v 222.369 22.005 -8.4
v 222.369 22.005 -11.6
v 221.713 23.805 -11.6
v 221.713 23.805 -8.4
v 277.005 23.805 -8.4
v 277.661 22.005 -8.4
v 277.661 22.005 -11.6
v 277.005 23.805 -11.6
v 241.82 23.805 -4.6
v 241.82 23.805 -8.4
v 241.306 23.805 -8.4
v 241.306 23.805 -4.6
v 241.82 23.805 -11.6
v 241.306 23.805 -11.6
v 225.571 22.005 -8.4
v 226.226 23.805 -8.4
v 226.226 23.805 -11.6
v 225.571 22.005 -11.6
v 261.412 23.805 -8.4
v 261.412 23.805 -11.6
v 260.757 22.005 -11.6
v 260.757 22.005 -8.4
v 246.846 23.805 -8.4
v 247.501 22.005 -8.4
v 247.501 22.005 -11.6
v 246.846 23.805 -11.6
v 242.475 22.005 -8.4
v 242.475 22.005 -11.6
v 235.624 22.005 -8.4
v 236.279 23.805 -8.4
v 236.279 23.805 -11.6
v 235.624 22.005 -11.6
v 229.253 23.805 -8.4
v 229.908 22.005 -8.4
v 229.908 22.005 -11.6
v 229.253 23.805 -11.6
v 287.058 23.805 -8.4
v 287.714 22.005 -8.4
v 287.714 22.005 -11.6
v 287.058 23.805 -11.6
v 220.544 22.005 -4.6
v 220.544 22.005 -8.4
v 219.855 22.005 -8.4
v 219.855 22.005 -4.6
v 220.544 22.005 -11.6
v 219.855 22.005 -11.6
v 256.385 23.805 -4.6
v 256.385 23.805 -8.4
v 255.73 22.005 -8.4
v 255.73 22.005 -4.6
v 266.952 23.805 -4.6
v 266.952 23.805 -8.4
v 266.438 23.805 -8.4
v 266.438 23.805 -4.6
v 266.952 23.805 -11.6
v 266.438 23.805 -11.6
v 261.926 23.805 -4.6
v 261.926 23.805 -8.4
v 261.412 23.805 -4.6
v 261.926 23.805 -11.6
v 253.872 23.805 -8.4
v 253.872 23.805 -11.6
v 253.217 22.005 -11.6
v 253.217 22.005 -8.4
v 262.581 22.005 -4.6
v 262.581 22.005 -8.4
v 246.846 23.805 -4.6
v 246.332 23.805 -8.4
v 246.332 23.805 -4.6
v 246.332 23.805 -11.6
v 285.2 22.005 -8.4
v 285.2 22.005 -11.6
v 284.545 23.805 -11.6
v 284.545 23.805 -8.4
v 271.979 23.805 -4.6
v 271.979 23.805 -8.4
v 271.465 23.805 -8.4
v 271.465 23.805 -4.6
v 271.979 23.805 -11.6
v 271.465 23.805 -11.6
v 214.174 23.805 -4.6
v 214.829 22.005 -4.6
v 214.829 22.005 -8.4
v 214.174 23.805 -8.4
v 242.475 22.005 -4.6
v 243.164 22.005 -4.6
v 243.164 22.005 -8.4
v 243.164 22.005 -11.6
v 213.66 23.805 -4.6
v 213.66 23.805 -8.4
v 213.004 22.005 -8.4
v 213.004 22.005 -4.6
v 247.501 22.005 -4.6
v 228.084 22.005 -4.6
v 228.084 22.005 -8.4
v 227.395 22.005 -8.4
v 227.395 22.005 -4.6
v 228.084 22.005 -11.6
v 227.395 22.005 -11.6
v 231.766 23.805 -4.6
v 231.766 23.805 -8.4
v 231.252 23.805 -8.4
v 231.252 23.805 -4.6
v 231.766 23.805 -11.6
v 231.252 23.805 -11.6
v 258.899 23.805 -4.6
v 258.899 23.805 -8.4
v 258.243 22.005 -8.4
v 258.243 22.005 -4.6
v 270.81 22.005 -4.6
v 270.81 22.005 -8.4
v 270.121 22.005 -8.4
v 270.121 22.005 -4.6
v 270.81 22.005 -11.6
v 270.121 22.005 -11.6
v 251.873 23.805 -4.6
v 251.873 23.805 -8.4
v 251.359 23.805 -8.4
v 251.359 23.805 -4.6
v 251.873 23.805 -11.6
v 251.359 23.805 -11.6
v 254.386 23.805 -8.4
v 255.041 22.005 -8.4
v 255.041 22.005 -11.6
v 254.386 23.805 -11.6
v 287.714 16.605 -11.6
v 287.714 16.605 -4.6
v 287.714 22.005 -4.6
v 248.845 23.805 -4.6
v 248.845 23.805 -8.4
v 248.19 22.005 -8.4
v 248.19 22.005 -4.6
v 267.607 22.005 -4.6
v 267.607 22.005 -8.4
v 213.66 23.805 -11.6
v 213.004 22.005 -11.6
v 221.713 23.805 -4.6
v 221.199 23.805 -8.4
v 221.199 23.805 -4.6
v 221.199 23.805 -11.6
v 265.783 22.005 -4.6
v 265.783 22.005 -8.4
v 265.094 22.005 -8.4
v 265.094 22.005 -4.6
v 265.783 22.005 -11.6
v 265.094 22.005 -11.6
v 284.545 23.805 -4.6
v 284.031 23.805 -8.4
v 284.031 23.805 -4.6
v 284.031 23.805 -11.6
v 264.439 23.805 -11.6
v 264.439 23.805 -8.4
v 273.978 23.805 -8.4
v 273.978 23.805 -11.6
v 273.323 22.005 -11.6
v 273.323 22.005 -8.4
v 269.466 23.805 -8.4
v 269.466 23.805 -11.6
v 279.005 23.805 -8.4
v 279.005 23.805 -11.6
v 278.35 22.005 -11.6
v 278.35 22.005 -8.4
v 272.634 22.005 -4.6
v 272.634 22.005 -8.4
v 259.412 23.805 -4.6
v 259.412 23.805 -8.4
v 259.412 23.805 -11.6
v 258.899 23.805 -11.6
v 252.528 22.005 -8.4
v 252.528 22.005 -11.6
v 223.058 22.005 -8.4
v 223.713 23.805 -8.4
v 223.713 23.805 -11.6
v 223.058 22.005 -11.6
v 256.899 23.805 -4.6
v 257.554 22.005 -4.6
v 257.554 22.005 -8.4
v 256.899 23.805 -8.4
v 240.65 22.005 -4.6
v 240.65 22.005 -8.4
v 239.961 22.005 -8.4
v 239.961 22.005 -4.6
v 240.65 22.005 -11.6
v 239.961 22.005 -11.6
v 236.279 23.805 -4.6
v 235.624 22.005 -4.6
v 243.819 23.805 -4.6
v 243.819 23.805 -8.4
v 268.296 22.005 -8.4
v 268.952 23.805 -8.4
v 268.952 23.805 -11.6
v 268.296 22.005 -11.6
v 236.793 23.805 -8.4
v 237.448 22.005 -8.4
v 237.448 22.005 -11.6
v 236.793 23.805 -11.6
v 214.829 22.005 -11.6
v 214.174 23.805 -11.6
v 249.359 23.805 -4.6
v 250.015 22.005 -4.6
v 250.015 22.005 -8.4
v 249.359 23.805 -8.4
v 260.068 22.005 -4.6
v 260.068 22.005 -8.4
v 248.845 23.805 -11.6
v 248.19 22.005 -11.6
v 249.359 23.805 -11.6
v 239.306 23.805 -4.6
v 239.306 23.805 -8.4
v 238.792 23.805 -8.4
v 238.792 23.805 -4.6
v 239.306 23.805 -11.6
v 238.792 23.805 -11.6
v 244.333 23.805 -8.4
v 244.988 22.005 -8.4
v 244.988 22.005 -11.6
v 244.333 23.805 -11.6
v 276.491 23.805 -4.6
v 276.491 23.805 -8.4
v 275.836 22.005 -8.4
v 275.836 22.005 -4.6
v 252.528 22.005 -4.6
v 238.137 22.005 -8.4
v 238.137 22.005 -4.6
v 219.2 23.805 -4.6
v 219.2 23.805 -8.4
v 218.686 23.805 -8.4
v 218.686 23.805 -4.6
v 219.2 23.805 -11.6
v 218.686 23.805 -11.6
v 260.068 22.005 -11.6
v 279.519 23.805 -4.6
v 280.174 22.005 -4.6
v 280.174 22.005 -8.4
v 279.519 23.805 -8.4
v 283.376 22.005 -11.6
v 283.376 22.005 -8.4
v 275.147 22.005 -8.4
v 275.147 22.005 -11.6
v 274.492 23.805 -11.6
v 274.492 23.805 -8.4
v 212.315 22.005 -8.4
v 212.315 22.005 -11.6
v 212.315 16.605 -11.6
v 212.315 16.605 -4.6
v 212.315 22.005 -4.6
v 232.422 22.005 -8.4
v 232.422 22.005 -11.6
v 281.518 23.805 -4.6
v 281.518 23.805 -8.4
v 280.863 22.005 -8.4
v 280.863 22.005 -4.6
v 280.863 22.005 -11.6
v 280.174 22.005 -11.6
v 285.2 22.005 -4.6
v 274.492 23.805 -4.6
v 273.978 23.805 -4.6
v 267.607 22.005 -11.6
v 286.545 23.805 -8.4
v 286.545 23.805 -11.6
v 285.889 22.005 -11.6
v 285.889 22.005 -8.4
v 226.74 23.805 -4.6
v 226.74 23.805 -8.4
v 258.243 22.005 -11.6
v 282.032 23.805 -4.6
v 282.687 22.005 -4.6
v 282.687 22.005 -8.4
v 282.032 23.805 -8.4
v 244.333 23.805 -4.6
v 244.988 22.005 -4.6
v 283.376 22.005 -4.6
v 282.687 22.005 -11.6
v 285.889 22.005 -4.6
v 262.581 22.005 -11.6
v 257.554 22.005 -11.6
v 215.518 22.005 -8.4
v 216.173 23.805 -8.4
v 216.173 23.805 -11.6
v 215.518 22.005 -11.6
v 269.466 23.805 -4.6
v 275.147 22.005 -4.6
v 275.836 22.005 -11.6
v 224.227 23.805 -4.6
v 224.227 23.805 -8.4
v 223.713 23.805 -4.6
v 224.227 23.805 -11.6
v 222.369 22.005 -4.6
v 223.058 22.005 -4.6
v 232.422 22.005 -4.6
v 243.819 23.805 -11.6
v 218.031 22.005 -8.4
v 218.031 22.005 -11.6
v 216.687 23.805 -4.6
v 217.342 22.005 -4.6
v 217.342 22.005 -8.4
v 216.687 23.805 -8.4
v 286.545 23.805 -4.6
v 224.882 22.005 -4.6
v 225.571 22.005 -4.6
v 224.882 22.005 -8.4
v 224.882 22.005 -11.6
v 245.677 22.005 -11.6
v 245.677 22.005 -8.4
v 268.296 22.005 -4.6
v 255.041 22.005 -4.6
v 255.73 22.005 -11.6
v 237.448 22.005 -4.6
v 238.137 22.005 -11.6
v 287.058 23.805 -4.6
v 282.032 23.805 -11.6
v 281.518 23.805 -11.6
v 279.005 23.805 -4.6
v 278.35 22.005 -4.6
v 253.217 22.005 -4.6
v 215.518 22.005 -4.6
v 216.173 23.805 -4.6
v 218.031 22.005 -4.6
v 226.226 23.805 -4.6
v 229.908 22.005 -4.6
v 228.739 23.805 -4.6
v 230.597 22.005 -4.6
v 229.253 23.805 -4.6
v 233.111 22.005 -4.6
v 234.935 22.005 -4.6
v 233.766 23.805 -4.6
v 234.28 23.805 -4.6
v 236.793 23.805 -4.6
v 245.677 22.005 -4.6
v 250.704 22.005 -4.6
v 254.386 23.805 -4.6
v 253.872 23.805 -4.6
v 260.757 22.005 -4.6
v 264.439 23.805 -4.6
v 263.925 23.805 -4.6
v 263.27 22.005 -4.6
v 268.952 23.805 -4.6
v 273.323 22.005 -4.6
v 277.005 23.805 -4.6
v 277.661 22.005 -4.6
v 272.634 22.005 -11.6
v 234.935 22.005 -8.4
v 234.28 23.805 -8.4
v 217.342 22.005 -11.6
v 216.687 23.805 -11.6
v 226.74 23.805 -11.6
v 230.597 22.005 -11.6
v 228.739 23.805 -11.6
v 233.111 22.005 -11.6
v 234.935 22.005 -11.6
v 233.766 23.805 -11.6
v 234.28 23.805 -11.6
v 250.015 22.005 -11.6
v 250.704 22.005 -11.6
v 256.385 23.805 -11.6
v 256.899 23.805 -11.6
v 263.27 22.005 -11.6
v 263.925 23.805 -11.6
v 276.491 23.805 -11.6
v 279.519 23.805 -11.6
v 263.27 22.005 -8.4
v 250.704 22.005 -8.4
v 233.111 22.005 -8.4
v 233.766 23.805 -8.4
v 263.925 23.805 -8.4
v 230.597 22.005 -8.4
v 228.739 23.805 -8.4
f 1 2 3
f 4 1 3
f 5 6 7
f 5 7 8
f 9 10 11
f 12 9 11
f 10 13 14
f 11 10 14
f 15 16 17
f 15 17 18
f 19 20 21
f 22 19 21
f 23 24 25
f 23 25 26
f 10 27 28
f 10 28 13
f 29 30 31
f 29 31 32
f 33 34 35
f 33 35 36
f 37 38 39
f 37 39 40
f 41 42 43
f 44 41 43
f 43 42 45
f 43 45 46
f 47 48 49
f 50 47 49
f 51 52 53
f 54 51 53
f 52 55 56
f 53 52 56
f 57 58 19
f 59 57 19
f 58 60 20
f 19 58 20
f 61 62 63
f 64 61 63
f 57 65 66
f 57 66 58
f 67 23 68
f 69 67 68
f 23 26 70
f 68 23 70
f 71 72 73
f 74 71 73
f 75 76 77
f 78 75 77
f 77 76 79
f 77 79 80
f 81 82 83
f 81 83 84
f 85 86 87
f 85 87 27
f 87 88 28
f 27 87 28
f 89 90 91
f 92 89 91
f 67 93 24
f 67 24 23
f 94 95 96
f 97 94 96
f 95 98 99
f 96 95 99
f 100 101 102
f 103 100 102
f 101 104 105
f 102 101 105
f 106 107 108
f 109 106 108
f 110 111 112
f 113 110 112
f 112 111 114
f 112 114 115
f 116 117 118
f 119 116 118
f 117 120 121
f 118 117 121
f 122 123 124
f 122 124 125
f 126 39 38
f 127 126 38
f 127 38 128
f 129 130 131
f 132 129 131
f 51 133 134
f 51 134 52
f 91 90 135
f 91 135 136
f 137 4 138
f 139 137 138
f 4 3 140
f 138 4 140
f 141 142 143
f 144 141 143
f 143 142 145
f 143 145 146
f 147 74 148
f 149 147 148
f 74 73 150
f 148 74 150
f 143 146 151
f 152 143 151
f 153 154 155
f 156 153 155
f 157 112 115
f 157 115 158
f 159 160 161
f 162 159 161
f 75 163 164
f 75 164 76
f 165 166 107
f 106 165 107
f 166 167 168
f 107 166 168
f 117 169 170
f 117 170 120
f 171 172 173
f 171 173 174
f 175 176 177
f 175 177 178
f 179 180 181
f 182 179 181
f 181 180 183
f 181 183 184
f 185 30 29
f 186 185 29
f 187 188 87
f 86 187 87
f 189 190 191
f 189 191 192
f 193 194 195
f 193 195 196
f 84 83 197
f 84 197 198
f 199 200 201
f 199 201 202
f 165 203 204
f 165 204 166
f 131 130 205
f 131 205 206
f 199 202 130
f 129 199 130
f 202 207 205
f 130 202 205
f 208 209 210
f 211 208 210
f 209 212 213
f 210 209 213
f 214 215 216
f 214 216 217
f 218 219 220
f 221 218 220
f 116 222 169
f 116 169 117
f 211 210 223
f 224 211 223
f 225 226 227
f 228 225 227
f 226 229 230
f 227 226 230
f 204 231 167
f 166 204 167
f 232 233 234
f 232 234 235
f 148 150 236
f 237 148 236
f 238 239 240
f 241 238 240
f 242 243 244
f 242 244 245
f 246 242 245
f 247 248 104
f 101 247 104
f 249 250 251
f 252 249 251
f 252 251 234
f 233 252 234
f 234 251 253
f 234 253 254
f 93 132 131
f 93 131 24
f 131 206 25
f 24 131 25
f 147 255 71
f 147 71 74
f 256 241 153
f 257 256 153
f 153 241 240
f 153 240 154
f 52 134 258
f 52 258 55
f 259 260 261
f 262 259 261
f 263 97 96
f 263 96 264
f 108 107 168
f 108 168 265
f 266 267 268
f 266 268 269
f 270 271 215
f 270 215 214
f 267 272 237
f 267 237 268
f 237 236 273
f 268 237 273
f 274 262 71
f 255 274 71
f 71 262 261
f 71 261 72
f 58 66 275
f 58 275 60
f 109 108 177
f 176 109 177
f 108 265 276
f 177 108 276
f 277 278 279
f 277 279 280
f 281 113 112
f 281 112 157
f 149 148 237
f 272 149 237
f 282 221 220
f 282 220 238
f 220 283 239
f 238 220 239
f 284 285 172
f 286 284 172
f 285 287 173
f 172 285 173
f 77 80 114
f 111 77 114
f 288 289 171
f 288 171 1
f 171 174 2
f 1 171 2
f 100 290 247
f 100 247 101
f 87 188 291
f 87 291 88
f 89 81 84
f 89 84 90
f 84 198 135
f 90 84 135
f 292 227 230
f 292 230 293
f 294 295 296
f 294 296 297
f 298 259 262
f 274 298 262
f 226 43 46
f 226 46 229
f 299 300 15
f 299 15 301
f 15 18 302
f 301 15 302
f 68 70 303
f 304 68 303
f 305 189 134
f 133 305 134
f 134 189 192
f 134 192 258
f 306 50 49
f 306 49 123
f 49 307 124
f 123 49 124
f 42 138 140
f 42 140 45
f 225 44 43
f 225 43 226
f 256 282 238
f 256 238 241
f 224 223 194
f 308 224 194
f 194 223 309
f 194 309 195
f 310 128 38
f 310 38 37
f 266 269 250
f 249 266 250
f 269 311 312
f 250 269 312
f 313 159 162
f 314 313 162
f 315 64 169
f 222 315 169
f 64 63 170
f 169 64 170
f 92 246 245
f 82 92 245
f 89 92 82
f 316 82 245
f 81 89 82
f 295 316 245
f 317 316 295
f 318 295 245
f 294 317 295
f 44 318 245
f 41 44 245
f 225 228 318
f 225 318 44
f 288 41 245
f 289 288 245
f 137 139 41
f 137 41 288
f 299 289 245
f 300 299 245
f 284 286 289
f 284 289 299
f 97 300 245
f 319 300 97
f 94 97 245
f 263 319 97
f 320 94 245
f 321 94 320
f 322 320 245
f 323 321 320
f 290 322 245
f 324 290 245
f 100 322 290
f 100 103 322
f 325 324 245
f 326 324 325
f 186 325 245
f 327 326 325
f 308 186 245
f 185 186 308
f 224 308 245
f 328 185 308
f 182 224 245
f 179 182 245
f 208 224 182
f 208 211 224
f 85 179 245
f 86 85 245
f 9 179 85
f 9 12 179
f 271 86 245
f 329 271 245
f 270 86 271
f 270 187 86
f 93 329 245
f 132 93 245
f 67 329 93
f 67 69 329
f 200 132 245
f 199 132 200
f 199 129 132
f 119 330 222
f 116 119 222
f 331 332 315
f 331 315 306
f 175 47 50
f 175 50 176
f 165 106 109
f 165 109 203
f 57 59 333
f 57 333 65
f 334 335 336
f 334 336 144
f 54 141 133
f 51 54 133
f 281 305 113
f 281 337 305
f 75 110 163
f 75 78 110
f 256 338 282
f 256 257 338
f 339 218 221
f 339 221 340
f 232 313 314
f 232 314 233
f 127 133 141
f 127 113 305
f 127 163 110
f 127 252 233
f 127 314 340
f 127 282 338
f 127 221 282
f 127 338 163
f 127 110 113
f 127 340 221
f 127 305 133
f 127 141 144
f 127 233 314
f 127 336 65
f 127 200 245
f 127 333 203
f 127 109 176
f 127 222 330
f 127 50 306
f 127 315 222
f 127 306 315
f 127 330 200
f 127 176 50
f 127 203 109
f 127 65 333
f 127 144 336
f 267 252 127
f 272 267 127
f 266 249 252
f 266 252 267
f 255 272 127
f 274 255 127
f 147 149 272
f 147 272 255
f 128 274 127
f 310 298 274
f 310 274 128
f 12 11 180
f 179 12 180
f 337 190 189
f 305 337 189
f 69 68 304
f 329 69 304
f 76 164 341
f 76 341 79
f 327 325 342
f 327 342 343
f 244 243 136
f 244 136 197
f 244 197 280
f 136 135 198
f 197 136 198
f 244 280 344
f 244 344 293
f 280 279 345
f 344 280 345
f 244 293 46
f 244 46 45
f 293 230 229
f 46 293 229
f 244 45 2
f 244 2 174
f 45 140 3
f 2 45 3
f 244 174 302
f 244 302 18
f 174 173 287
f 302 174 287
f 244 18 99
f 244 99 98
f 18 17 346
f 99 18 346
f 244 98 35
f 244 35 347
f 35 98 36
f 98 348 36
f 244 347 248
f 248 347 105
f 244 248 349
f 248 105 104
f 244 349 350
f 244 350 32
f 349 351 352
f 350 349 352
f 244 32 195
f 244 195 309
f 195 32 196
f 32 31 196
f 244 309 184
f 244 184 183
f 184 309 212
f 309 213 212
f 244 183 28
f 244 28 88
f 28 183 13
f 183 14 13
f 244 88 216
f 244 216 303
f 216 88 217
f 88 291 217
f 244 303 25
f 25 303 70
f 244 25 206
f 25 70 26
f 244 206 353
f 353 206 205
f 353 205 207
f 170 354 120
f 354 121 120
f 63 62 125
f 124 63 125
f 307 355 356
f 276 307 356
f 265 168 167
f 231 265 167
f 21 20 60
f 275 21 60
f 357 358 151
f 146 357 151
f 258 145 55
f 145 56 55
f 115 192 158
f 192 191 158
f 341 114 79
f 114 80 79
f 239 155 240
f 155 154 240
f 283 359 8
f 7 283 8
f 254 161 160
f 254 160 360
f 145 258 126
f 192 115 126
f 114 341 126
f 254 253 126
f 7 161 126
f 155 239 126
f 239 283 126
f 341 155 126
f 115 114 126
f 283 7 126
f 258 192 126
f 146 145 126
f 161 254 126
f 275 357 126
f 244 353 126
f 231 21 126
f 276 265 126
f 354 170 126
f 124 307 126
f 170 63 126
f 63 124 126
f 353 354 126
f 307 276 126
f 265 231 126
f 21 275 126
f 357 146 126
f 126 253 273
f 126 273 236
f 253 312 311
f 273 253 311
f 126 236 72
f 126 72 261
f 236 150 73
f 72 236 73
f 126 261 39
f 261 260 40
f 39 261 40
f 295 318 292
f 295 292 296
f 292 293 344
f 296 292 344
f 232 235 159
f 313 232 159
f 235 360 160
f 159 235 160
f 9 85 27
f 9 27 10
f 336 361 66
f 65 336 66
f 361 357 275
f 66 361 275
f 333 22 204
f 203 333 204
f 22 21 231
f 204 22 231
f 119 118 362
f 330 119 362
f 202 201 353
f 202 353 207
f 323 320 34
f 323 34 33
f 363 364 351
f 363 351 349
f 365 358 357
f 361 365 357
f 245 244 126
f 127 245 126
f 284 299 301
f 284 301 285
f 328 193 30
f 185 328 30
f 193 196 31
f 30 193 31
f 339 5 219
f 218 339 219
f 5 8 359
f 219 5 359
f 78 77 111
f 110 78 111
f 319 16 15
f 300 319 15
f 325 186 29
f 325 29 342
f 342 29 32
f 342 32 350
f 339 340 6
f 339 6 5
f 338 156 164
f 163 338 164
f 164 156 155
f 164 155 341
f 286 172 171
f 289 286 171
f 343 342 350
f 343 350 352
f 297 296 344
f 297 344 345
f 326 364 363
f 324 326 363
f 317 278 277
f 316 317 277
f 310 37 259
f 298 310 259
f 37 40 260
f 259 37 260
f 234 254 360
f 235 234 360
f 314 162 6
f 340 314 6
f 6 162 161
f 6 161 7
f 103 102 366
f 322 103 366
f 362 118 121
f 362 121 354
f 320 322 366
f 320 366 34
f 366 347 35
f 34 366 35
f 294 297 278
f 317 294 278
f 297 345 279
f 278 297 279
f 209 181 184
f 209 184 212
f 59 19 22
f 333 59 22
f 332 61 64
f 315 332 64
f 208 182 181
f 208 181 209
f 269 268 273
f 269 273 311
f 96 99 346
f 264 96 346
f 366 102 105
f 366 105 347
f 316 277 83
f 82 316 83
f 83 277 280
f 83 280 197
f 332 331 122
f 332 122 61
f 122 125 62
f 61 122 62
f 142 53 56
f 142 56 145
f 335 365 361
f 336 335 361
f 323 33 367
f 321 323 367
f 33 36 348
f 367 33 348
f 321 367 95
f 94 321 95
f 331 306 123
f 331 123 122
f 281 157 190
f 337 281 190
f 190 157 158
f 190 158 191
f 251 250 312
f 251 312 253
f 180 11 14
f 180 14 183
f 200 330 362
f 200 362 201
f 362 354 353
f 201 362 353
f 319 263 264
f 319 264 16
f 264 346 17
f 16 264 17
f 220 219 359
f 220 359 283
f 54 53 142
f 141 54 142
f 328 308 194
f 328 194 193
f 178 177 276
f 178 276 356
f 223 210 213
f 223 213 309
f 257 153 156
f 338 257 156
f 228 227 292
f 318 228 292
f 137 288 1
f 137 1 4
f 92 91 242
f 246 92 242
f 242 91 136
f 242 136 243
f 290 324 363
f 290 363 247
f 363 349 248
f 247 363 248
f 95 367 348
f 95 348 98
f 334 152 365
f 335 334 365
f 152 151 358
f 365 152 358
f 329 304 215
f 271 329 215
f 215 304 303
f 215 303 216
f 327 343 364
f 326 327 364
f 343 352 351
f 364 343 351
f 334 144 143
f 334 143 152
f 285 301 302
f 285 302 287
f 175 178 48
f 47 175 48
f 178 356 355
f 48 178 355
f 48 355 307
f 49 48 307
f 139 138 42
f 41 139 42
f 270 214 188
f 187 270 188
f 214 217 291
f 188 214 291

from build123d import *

# Parameters (mm, degrees)
BLANKSKE_W                   = 500
BLANKSKE_H                   = 45
BLANK_DEPTH                  = 20
TOOTHCUTSIM_DEPTH            = 503.419147724
TEETHCUTS_COUNT              = 33
TEETHCUTS_PITCH              = 15.70796325
SCALA1_SCALE                 = 0.16
ESTRUSIONE_ESTRUSIONE1_DEPTH = 3.8
TAGLIO_ESTRUSIONE2_DEPTH     = 10
TAGLIO_ESTRUSIONE3_DEPTH     = 10


with BuildPart() as part:
    # BlankSke → Blank (new body)
    with BuildSketch(Plane.XY):
        with Locations((250, 22.5)):
            Rectangle(BLANKSKE_W, BLANKSKE_H)
    extrude(amount=-BLANK_DEPTH)

    # TooCutSkeSim → ToothCutSim (cut, through all)
    with BuildSketch(Plane.XY):
        Polygon((2.153176848, 33.75), (-2.153176848, 33.75), (-6.257086828, 45.0254), (6.257086828, 45.0254), align=None)
    toothcutsim = extrude(amount=-TOOTHCUTSIM_DEPTH, mode=Mode.SUBTRACT)

    # TeethCuts: ToothCutSim ×33
    with Locations(*[(i * TEETHCUTS_PITCH, 0, 0) for i in range(1, TEETHCUTS_COUNT)]):
        add(toothcutsim, mode=Mode.SUBTRACT)


with BuildPart() as part_1:
    # Scala1: scaled about (250.174583298, 19.767382057, -10)
    add(part.part.scale(SCALA1_SCALE).moved(Location((210.14664997, 16.604600928, -8.4))))

    # Schizzo1 → Estrusione-Estrusione1 (add)
    with BuildSketch(Plane.XY.offset(-8.4)):
        Polygon((290.14664997, 16.604600928), (290.14664997, 22.225123203), (289.571767093, 23.804600928), (289.057802407, 23.804600928), (288.402655986, 22.004600928), (287.713639394, 22.004600928), (287.058492973, 23.804600928), (286.544528287, 23.804600928), (285.889381866, 22.004600928), (285.200365274, 22.004600928), (284.545218853, 23.804600928), (284.031254167, 23.804600928), (283.376107746, 22.004600928), (282.687091154, 22.004600928), (282.031944733, 23.804600928), (281.517980047, 23.804600928), (280.862833626, 22.004600928), (280.173817034, 22.004600928), (279.518670613, 23.804600928), (279.004705927, 23.804600928), (278.349559506, 22.004600928), (277.660542914, 22.004600928), (277.005396493, 23.804600928), (276.491431807, 23.804600928), (275.836285386, 22.004600928), (275.147268794, 22.004600928), (274.492122373, 23.804600928), (273.978157687, 23.804600928), (273.323011266, 22.004600928), (272.633994674, 22.004600928), (271.978848253, 23.804600928), (271.464883567, 23.804600928), (270.809737146, 22.004600928), (270.120720554, 22.004600928), (269.465574133, 23.804600928), (268.951609447, 23.804600928), (268.296463026, 22.004600928), (267.607446434, 22.004600928), (266.952300013, 23.804600928), (266.438335327, 23.804600928), (265.783188906, 22.004600928), (265.094172314, 22.004600928), (264.439025893, 23.804600928), (263.925061207, 23.804600928), (263.269914786, 22.004600928), (262.580898194, 22.004600928), (261.925751773, 23.804600928), (261.411787087, 23.804600928), (260.756640666, 22.004600928), (260.067624074, 22.004600928), (259.412477653, 23.804600928), (258.898512967, 23.804600928), (258.243366546, 22.004600928), (257.554349954, 22.004600928), (256.899203533, 23.804600928), (256.385238847, 23.804600928), (255.730092426, 22.004600928), (255.041075834, 22.004600928), (254.385929413, 23.804600928), (253.871964727, 23.804600928), (253.216818306, 22.004600928), (252.527801714, 22.004600928), (251.872655293, 23.804600928), (251.358690607, 23.804600928), (250.703544186, 22.004600928), (250.014527594, 22.004600928), (249.359381173, 23.804600928), (248.845416487, 23.804600928), (248.190270066, 22.004600928), (247.501253474, 22.004600928), (246.846107053, 23.804600928), (246.332142367, 23.804600928), (245.676995946, 22.004600928), (244.987979354, 22.004600928), (244.332832933, 23.804600928), (243.818868247, 23.804600928), (243.163721826, 22.004600928), (242.474705234, 22.004600928), (241.819558813, 23.804600928), (241.305594127, 23.804600928), (240.650447706, 22.004600928), (239.961431114, 22.004600928), (239.306284693, 23.804600928), (238.792320007, 23.804600928), (238.137173586, 22.004600928), (237.448156994, 22.004600928), (236.793010573, 23.804600928), (236.279045887, 23.804600928), (235.623899466, 22.004600928), (234.934882874, 22.004600928), (234.279736453, 23.804600928), (233.765771767, 23.804600928), (233.110625346, 22.004600928), (232.421608754, 22.004600928), (231.766462333, 23.804600928), (231.252497647, 23.804600928), (230.597351226, 22.004600928), (229.908334634, 22.004600928), (229.253188213, 23.804600928), (228.739223527, 23.804600928), (228.084077106, 22.004600928), (227.395060514, 22.004600928), (226.739914093, 23.804600928), (226.225949407, 23.804600928), (225.570802986, 22.004600928), (224.881786394, 22.004600928), (224.226639973, 23.804600928), (223.712675287, 23.804600928), (223.057528866, 22.004600928), (222.368512274, 22.004600928), (221.713365853, 23.804600928), (221.199401167, 23.804600928), (220.544254746, 22.004600928), (219.855238154, 22.004600928), (219.200091733, 23.804600928), (218.686127047, 23.804600928), (218.030980626, 22.004600928), (217.341964034, 22.004600928), (216.686817613, 23.804600928), (216.172852927, 23.804600928), (215.517706506, 22.004600928), (214.828689914, 22.004600928), (214.173543493, 23.804600928), (213.659578807, 23.804600928), (213.004432386, 22.004600928), (212.315415794, 22.004600928), (211.660269373, 23.804600928), (211.146304687, 23.804600928), (210.491158266, 22.004600928), (210.14664997, 22.004600928), (210.14664997, 16.604600928), align=None)
    extrude(amount=ESTRUSIONE_ESTRUSIONE1_DEPTH)

    # Schizzo2 → Taglio-Estrusione2 (cut, symmetric)
    with BuildSketch(Plane(origin=(0, 22.004600928, 0), x_dir=(1, 0, 0), z_dir=(0, 1, 0))):
        Polygon((212.315415794, 11.6), (212.315415794, 4.6), (208.462167245, 2.347877262), (205.897247637, 4.6), (205.110337821, 10.211571909), (209.734386357, 15.720465951), (212.233893697, 13.52577833), align=None)
    extrude(amount=TAGLIO_ESTRUSIONE2_DEPTH, both=True, mode=Mode.SUBTRACT)

    # Schizzo3 → Taglio-Estrusione3 (cut, symmetric)
    with BuildSketch(Plane(origin=(0, 22.004600928, 0), x_dir=(1, 0, 0), z_dir=(0, 1, 0))):
        Polygon((287.713639394, 4.6), (287.713639394, 11.6), (292.791663961, 17.742043918), (298.093315887, 11.169927051), (295.206395546, 3.598494096), (291.083357716, 1.033572149), (287.713639394, 3.819536015), align=None)
    extrude(amount=TAGLIO_ESTRUSIONE3_DEPTH, both=True, mode=Mode.SUBTRACT)


solid = part_1.part
